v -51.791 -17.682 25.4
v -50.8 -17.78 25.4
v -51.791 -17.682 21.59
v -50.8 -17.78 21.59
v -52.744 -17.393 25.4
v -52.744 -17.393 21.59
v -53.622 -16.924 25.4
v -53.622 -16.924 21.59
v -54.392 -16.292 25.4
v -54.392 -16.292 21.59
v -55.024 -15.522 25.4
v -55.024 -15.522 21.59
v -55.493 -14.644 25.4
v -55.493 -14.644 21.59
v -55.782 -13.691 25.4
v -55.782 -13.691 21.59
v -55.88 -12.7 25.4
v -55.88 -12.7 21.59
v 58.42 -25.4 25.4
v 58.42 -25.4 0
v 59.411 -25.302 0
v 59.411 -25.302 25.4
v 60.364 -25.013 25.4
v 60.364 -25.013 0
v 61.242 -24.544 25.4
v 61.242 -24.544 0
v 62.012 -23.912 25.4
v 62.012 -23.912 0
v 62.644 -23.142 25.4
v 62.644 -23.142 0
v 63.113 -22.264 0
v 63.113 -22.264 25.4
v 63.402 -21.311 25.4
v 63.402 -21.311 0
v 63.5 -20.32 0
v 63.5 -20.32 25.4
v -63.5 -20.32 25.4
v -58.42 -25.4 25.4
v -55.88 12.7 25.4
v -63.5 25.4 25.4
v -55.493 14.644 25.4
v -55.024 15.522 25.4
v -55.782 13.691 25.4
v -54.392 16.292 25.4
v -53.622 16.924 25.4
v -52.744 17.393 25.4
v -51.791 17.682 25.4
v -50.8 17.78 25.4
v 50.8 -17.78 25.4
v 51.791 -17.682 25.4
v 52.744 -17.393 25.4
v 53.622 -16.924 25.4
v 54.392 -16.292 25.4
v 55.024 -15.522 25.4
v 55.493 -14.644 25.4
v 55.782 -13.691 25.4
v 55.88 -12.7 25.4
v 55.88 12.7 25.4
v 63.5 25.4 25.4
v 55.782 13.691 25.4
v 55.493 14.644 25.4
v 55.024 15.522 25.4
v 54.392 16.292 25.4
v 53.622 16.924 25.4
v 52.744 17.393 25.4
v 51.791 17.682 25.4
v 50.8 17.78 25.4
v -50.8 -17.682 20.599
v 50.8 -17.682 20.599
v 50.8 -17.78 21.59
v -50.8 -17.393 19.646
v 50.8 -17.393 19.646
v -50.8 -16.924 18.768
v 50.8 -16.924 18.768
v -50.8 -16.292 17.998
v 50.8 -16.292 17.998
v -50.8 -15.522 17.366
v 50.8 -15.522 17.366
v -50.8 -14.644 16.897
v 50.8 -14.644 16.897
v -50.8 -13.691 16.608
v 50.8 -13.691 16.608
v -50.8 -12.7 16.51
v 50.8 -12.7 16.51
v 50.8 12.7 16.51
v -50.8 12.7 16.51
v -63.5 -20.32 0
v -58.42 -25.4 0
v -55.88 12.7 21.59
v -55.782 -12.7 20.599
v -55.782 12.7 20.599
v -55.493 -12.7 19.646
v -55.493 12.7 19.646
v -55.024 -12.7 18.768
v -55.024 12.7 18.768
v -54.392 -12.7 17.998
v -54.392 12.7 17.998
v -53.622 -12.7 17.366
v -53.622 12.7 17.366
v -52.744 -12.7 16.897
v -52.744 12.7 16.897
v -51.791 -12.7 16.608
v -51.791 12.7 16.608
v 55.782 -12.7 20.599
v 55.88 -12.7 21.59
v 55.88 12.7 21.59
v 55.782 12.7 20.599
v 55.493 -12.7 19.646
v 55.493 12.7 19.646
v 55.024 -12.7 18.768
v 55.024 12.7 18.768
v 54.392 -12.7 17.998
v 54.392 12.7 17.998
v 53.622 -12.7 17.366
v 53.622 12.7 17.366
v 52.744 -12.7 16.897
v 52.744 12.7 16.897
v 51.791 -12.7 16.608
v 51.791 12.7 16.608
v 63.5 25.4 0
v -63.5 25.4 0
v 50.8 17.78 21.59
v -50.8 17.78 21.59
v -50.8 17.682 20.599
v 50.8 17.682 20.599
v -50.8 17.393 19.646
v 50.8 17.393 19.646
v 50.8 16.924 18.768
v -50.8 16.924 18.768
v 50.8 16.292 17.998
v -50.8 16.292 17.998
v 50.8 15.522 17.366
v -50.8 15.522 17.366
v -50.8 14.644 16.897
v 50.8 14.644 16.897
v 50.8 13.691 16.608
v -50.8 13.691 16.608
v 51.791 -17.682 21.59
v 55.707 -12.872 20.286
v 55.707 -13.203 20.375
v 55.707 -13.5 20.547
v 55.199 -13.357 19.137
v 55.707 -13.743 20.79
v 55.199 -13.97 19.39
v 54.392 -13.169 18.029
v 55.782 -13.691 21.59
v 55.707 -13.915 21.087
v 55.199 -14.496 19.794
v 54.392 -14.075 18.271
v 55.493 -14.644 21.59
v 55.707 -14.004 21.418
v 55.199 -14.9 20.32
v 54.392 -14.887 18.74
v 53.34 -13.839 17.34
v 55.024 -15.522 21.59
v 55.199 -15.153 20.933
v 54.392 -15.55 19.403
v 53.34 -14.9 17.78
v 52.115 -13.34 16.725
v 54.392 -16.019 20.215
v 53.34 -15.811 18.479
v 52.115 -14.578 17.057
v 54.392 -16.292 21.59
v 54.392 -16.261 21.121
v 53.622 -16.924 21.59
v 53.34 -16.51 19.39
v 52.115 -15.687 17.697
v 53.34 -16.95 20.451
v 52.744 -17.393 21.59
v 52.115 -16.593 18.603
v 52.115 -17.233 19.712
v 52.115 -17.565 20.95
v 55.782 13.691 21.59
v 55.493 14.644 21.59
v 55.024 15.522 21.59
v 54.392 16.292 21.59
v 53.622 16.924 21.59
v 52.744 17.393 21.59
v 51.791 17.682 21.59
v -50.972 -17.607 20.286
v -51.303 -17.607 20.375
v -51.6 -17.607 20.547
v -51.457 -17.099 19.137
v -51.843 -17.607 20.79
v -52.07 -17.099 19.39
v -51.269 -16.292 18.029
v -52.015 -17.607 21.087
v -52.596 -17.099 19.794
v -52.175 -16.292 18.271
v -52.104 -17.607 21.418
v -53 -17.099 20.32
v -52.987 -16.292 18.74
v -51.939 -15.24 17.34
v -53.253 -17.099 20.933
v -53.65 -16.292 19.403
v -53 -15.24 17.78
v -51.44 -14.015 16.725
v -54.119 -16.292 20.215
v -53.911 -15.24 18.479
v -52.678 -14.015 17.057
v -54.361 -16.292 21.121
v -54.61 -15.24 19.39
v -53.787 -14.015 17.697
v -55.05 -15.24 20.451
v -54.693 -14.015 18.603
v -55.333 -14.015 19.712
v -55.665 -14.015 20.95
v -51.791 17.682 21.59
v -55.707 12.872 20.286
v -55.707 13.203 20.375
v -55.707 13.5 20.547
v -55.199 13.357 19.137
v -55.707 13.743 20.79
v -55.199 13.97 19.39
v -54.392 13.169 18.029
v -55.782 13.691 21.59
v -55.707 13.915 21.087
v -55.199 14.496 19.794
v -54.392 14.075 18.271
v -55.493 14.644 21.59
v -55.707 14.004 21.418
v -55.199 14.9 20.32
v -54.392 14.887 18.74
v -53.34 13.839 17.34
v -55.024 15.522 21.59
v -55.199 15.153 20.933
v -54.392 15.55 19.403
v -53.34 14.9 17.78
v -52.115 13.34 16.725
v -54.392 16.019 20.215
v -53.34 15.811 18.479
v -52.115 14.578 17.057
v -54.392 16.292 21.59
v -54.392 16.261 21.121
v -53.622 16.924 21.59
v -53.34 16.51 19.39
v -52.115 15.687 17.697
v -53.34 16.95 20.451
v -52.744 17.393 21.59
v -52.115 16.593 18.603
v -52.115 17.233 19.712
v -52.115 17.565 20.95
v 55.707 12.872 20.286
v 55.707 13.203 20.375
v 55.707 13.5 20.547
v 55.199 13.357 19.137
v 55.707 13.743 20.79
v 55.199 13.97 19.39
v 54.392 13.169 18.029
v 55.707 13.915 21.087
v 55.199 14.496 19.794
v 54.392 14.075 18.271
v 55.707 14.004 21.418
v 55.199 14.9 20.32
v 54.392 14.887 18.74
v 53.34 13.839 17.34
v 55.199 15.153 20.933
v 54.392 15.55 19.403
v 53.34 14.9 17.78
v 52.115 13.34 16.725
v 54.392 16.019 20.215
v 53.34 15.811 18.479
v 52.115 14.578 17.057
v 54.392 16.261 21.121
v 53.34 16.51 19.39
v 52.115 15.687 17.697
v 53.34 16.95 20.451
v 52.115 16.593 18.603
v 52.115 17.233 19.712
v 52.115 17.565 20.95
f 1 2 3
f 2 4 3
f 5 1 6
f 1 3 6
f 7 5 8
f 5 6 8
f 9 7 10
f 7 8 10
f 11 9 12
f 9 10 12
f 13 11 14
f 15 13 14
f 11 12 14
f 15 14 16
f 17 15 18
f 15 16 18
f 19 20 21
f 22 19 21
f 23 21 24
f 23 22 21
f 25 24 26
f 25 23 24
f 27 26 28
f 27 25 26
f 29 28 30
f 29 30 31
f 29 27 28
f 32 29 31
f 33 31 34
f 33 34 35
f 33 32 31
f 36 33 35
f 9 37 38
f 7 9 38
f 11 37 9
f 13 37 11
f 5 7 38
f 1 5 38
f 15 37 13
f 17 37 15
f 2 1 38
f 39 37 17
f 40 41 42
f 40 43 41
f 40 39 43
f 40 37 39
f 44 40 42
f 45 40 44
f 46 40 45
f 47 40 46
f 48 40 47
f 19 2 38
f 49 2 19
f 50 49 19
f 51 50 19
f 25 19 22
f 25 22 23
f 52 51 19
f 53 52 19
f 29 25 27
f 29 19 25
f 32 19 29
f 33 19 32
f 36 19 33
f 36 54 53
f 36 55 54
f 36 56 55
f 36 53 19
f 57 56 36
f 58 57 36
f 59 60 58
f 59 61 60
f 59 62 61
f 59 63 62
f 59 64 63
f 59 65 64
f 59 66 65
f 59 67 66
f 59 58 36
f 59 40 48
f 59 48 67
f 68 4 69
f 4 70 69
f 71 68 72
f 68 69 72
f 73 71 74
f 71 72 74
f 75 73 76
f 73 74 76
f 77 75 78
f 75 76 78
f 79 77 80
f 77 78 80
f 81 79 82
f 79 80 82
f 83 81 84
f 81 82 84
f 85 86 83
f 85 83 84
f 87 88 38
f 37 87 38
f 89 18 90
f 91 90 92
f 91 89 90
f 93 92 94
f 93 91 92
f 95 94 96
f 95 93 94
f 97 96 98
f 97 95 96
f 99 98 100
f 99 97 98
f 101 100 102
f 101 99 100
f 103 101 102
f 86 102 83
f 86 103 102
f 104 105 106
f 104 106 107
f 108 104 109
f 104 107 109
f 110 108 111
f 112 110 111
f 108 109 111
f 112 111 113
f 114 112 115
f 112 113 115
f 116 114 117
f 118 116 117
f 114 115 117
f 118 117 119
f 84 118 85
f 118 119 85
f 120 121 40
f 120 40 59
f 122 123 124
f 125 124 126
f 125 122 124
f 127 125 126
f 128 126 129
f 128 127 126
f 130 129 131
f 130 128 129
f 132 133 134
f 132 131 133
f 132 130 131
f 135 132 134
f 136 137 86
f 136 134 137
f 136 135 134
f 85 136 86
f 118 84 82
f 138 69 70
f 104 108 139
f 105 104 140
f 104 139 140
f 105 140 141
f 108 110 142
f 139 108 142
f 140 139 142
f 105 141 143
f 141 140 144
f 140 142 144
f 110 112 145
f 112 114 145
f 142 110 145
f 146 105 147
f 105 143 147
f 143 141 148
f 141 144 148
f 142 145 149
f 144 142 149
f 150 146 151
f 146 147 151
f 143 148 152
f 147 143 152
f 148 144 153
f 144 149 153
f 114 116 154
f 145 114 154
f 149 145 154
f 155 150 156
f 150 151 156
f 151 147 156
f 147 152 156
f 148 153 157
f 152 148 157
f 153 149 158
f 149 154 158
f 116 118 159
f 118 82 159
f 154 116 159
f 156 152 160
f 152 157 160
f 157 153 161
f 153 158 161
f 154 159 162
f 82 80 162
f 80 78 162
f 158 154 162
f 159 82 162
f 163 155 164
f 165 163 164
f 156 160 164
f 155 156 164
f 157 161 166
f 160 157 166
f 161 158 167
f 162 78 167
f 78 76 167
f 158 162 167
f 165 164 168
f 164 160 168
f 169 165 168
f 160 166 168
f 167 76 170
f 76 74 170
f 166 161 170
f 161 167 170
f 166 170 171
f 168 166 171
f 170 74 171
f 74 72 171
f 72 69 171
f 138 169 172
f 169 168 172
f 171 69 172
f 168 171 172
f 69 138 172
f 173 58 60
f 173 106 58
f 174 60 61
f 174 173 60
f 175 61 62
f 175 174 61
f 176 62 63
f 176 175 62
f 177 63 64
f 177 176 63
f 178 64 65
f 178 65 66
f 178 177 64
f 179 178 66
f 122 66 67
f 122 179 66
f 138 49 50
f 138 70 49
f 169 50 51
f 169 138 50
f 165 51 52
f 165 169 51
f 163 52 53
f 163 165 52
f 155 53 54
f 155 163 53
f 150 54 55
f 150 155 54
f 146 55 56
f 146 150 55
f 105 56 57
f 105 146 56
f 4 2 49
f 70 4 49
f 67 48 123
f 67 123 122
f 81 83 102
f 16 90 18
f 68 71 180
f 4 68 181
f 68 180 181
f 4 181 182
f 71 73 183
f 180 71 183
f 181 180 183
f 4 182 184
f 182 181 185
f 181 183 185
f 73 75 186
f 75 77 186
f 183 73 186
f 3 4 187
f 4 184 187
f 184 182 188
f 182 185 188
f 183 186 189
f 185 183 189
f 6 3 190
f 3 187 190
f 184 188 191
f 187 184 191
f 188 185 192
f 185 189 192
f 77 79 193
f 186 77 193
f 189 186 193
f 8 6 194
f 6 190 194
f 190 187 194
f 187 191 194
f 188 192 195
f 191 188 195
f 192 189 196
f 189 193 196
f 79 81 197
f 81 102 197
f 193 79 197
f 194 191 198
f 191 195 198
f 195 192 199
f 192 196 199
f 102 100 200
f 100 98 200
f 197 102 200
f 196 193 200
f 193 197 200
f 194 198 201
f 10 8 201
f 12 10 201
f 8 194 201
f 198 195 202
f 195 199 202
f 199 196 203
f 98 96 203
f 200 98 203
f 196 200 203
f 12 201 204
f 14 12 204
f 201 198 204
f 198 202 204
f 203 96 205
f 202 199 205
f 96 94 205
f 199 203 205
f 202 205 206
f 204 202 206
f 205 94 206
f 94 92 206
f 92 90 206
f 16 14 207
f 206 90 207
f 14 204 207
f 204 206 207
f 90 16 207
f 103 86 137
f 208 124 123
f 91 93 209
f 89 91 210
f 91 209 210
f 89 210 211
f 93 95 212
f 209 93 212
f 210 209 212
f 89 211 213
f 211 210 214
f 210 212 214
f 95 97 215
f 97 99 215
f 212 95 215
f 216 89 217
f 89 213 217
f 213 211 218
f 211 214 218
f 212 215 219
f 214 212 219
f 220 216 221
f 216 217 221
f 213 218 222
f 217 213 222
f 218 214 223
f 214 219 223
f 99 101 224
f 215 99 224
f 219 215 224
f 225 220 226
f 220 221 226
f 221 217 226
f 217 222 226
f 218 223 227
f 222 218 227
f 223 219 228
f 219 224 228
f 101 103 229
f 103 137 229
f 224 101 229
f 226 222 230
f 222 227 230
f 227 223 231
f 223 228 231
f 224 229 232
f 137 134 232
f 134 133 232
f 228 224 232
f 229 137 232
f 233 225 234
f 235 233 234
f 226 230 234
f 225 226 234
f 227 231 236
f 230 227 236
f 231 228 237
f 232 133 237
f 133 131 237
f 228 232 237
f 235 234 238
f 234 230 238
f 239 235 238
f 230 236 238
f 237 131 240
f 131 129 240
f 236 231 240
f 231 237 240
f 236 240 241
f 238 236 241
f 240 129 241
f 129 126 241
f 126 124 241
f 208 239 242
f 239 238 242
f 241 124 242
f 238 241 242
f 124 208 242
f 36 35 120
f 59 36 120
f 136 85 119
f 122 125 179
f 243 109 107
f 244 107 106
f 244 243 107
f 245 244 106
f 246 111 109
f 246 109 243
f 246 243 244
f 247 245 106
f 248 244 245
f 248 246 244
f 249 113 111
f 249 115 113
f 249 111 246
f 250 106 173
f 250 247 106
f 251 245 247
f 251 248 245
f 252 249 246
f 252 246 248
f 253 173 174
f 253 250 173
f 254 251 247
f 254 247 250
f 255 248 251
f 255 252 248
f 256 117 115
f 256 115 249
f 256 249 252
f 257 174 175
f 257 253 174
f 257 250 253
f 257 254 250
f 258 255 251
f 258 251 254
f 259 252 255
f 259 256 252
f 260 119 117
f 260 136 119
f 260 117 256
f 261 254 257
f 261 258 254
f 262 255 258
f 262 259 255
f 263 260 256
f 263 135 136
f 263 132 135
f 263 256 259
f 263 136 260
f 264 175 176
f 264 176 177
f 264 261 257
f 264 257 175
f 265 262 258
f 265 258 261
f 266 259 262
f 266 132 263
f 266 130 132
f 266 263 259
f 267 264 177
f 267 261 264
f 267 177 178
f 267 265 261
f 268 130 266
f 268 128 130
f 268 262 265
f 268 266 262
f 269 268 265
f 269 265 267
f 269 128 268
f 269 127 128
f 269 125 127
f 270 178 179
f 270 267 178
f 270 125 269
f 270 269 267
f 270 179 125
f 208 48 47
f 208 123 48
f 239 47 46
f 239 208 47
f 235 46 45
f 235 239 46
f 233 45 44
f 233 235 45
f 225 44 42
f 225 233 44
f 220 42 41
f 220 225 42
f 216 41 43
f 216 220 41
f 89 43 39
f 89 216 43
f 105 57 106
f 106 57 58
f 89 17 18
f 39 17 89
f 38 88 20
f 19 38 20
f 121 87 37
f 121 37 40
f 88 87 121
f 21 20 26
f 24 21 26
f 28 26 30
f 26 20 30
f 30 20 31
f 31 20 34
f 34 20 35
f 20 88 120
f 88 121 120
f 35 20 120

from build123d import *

# Parameters (mm, degrees)
F0_W     = 127
F0_H     = 50.8
F1_DEPTH = 25.4
F2_SIZE  = 5.08
F3_R     = 5.08
F4_W     = 111.76
F4_H     = 35.56
F5_DEPTH = 8.89
F6_R     = 5.08


with BuildPart() as f1:
    # F0 (on Top) → F1 (new body)
    with BuildSketch(Plane.XY):
        Rectangle(F0_W, F0_H)
    extrude(amount=F1_DEPTH)

    # F2
    f2_edges = [f1.edges().sort_by_distance(p)[0] for p in [
        (-63.5, -25.4, 12.7),
    ]]
    chamfer(f2_edges, length=F2_SIZE)

    # F3
    f3_edges = [f1.edges().sort_by_distance(p)[0] for p in [
        (63.5, -25.4, 12.7),
    ]]
    fillet(f3_edges, radius=F3_R)

    # F4 (on face) → F5 (cut)
    with BuildSketch(Plane.XY.offset(25.4)):
        Rectangle(F4_W, F4_H)
    extrude(amount=-F5_DEPTH, mode=Mode.SUBTRACT)

    # F6
    f6_edges = [f1.edges().sort_by_distance(p)[0] for p in [
        (0, 17.78, 16.51),
        (-55.88, 0, 16.51),
        (0, -17.78, 16.51),
        (55.88, 0, 16.51),
        (-55.88, 17.78, 20.955),
        (-55.88, -17.78, 20.955),
        (55.88, -17.78, 20.955),
        (55.88, 17.78, 20.955),
    ]]
    fillet(f6_edges, radius=F6_R)


solid = f1.part
